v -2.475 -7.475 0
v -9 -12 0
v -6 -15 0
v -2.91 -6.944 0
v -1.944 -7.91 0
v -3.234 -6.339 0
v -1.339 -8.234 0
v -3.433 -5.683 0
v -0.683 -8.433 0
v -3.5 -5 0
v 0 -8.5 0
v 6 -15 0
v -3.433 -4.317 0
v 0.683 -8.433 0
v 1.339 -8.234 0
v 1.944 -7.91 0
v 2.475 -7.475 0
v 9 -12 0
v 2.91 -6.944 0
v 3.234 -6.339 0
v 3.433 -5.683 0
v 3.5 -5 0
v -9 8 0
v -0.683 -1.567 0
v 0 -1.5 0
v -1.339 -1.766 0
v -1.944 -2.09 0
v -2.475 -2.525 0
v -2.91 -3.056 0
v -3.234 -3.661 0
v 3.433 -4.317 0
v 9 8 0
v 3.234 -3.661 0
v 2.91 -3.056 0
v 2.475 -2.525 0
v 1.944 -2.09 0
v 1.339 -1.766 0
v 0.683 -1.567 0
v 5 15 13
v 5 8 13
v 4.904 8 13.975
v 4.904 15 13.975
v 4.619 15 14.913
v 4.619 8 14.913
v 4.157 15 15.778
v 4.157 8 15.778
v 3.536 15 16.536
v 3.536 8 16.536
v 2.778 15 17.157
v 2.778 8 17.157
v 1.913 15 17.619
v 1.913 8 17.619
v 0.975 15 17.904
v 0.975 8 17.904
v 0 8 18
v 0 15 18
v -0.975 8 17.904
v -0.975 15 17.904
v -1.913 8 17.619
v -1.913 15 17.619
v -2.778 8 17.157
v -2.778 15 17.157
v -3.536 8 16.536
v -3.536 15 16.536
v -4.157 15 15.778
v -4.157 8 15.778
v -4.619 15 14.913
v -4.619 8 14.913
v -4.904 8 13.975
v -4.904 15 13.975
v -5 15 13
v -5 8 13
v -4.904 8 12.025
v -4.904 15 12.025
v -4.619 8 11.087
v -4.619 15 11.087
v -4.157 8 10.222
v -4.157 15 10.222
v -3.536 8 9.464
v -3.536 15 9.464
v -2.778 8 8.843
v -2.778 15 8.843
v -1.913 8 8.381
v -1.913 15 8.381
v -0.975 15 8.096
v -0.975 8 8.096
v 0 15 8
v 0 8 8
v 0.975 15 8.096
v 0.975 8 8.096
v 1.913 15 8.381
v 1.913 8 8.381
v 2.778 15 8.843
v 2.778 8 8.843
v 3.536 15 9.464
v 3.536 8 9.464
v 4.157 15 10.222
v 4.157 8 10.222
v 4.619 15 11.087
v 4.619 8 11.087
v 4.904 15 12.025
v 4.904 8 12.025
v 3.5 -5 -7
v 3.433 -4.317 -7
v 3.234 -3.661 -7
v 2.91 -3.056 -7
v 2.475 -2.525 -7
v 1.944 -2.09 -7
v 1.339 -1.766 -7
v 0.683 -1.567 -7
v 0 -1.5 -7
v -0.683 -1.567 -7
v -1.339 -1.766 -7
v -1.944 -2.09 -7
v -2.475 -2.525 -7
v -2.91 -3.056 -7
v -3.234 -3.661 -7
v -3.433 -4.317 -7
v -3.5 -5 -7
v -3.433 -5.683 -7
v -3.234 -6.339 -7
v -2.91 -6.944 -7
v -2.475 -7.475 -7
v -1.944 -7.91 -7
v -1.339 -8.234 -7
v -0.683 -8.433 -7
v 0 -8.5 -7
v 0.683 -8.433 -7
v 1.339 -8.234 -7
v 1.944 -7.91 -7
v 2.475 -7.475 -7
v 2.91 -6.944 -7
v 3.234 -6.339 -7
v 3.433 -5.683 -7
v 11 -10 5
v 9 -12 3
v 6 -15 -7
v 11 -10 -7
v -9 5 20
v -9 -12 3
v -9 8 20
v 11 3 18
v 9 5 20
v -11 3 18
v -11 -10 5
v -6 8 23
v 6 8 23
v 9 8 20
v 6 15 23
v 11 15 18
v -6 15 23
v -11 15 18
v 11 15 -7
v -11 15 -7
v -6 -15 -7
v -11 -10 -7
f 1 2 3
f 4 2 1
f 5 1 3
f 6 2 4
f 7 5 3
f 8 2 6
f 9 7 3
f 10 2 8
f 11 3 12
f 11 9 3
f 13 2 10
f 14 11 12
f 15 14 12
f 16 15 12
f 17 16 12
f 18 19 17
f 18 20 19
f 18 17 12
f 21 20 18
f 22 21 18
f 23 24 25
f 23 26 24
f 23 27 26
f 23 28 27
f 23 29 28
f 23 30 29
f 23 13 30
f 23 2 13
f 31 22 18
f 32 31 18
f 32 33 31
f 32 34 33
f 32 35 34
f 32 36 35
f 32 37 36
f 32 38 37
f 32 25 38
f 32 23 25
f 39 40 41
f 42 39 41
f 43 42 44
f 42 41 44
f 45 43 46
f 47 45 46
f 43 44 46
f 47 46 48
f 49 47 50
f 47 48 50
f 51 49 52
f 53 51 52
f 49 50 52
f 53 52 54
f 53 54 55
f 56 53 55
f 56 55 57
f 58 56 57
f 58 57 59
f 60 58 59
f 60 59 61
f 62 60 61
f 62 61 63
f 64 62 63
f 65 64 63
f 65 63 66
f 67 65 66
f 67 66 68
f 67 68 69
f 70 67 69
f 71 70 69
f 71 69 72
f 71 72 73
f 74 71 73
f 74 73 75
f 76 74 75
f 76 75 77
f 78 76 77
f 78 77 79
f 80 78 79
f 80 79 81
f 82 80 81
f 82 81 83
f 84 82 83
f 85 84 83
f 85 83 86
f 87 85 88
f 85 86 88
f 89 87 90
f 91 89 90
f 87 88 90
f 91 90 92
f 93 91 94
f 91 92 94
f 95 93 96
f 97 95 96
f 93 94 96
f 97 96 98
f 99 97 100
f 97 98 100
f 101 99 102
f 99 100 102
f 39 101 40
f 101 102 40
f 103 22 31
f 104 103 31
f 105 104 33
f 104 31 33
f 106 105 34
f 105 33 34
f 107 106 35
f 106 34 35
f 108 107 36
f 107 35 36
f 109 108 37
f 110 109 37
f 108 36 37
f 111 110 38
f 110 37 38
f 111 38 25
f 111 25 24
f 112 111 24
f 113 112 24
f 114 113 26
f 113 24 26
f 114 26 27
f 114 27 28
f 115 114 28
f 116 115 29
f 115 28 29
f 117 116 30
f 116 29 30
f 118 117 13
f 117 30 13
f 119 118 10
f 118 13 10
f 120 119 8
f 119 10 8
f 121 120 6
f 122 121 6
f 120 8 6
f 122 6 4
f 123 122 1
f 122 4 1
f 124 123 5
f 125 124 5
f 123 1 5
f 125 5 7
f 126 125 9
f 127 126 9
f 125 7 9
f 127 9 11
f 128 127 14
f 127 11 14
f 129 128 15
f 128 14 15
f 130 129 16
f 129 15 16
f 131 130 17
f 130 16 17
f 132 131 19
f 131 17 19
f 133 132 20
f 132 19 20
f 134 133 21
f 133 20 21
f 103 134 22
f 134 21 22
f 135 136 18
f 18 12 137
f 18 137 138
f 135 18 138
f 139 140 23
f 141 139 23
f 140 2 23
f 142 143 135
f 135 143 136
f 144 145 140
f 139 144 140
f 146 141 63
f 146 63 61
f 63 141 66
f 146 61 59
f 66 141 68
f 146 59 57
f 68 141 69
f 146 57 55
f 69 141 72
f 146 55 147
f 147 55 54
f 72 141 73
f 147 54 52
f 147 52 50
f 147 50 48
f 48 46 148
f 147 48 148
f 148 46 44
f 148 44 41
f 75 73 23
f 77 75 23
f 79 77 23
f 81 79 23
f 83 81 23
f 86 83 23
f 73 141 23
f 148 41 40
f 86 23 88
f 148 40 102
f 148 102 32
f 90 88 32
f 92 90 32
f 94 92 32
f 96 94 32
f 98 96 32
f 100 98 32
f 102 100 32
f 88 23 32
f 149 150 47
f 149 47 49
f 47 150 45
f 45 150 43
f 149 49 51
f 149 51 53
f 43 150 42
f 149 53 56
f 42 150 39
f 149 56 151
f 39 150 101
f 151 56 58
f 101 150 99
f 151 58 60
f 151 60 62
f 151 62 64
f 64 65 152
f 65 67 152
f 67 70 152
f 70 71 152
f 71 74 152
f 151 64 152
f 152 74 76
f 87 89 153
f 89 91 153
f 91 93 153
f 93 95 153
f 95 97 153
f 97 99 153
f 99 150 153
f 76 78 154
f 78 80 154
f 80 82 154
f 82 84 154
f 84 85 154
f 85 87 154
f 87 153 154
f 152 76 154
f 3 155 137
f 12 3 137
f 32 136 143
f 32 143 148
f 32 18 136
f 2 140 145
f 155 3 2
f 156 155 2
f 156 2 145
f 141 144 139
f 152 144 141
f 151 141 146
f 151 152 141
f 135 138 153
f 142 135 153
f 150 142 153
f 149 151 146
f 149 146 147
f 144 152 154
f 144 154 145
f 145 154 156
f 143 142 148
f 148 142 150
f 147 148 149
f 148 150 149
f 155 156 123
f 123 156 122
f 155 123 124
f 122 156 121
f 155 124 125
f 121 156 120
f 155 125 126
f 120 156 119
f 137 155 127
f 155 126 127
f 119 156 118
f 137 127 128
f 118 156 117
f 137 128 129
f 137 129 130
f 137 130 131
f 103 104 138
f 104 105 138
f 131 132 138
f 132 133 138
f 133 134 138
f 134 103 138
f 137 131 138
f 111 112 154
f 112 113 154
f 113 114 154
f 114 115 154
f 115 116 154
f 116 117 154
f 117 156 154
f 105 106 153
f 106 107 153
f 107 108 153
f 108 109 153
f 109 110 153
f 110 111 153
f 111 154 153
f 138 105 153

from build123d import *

# Parameters (mm, degrees)
F0_W        = 2
F0_H        = 23
F0_W_2      = 18
F0_R        = 3.5
F1_DEPTH    = 7
F2_DEPTH    = 23
F3_R        = 5
F4_DEPTH    = 25
F5_SIZE     = 23
F6_T1_DEPTH = 32.7168298797
F6_T3_DEPTH = 32.7168298797


# Not quite as in the source:
# - a fillet or chamfer that OpenCascade refuses, or shapes differently, is made with other operations: its cross-section is extruded or revolved along the edge and cut away or added


with BuildPart() as f1:
    # F0 (on Top) → F1 (new body)
    with BuildSketch(Plane.XY):
        with Locations((-10, -3.5)):
            Rectangle(F0_W, F0_H)
        with Locations((0, -3.5)):
            Rectangle(F0_W_2, F0_H)
        with Locations((0, -5)):
            Circle(F0_R, mode=Mode.SUBTRACT)
        with Locations((10, -3.5)):
            Rectangle(F0_W, F0_H)
        Polygon((9, 8), (11, 8), (11, 15), (-11, 15), (-11, 8), (-9, 8), align=None)
    extrude(amount=-F1_DEPTH)

    # F0 (on Top) → F2 (join)
    with BuildSketch(Plane.XY):
        Polygon((9, 8), (11, 8), (11, 15), (-11, 15), (-11, 8), (-9, 8), align=None)
        with Locations((-10, -3.5)):
            Rectangle(F0_W, F0_H)
        with Locations((10, -3.5)):
            Rectangle(F0_W, F0_H)
    extrude(amount=F2_DEPTH)

    # F3 (on face) → F4 (cut)
    with BuildSketch(Plane.XZ.offset(-8)):
        with Locations((0, 13)):
            Circle(F3_R)
    extrude(amount=-F4_DEPTH, mode=Mode.SUBTRACT)

    # F5
    f5_edges = [f1.edges().sort_by_distance(p)[0] for p in [
        (10, -15, 23),
        (-10, -15, 23),
    ]]
    chamfer(f5_edges, length=F5_SIZE)

    # F6: chamfer of 5 on 4 edges, made by hand

    # F6_s2 → F6_t1 (cut)
    with BuildSketch(Plane.XY.offset(-19.8584149398)):
        Polygon((-6, -15), (-11, -10), (-11, -15), align=None)
        Polygon((6, -15), (11, -10), (11, -15), align=None)
    extrude(amount=F6_T1_DEPTH, mode=Mode.SUBTRACT)

    # F6_s4 → F6_t3 (cut)
    with BuildSketch(Plane.XZ.offset(-27.8584149398)):
        Polygon((-11, 18), (-6, 23), (-11, 23), align=None)
        Polygon((11, 18), (6, 23), (11, 23), align=None)
    extrude(amount=F6_T3_DEPTH, mode=Mode.SUBTRACT)


solid = f1.part
